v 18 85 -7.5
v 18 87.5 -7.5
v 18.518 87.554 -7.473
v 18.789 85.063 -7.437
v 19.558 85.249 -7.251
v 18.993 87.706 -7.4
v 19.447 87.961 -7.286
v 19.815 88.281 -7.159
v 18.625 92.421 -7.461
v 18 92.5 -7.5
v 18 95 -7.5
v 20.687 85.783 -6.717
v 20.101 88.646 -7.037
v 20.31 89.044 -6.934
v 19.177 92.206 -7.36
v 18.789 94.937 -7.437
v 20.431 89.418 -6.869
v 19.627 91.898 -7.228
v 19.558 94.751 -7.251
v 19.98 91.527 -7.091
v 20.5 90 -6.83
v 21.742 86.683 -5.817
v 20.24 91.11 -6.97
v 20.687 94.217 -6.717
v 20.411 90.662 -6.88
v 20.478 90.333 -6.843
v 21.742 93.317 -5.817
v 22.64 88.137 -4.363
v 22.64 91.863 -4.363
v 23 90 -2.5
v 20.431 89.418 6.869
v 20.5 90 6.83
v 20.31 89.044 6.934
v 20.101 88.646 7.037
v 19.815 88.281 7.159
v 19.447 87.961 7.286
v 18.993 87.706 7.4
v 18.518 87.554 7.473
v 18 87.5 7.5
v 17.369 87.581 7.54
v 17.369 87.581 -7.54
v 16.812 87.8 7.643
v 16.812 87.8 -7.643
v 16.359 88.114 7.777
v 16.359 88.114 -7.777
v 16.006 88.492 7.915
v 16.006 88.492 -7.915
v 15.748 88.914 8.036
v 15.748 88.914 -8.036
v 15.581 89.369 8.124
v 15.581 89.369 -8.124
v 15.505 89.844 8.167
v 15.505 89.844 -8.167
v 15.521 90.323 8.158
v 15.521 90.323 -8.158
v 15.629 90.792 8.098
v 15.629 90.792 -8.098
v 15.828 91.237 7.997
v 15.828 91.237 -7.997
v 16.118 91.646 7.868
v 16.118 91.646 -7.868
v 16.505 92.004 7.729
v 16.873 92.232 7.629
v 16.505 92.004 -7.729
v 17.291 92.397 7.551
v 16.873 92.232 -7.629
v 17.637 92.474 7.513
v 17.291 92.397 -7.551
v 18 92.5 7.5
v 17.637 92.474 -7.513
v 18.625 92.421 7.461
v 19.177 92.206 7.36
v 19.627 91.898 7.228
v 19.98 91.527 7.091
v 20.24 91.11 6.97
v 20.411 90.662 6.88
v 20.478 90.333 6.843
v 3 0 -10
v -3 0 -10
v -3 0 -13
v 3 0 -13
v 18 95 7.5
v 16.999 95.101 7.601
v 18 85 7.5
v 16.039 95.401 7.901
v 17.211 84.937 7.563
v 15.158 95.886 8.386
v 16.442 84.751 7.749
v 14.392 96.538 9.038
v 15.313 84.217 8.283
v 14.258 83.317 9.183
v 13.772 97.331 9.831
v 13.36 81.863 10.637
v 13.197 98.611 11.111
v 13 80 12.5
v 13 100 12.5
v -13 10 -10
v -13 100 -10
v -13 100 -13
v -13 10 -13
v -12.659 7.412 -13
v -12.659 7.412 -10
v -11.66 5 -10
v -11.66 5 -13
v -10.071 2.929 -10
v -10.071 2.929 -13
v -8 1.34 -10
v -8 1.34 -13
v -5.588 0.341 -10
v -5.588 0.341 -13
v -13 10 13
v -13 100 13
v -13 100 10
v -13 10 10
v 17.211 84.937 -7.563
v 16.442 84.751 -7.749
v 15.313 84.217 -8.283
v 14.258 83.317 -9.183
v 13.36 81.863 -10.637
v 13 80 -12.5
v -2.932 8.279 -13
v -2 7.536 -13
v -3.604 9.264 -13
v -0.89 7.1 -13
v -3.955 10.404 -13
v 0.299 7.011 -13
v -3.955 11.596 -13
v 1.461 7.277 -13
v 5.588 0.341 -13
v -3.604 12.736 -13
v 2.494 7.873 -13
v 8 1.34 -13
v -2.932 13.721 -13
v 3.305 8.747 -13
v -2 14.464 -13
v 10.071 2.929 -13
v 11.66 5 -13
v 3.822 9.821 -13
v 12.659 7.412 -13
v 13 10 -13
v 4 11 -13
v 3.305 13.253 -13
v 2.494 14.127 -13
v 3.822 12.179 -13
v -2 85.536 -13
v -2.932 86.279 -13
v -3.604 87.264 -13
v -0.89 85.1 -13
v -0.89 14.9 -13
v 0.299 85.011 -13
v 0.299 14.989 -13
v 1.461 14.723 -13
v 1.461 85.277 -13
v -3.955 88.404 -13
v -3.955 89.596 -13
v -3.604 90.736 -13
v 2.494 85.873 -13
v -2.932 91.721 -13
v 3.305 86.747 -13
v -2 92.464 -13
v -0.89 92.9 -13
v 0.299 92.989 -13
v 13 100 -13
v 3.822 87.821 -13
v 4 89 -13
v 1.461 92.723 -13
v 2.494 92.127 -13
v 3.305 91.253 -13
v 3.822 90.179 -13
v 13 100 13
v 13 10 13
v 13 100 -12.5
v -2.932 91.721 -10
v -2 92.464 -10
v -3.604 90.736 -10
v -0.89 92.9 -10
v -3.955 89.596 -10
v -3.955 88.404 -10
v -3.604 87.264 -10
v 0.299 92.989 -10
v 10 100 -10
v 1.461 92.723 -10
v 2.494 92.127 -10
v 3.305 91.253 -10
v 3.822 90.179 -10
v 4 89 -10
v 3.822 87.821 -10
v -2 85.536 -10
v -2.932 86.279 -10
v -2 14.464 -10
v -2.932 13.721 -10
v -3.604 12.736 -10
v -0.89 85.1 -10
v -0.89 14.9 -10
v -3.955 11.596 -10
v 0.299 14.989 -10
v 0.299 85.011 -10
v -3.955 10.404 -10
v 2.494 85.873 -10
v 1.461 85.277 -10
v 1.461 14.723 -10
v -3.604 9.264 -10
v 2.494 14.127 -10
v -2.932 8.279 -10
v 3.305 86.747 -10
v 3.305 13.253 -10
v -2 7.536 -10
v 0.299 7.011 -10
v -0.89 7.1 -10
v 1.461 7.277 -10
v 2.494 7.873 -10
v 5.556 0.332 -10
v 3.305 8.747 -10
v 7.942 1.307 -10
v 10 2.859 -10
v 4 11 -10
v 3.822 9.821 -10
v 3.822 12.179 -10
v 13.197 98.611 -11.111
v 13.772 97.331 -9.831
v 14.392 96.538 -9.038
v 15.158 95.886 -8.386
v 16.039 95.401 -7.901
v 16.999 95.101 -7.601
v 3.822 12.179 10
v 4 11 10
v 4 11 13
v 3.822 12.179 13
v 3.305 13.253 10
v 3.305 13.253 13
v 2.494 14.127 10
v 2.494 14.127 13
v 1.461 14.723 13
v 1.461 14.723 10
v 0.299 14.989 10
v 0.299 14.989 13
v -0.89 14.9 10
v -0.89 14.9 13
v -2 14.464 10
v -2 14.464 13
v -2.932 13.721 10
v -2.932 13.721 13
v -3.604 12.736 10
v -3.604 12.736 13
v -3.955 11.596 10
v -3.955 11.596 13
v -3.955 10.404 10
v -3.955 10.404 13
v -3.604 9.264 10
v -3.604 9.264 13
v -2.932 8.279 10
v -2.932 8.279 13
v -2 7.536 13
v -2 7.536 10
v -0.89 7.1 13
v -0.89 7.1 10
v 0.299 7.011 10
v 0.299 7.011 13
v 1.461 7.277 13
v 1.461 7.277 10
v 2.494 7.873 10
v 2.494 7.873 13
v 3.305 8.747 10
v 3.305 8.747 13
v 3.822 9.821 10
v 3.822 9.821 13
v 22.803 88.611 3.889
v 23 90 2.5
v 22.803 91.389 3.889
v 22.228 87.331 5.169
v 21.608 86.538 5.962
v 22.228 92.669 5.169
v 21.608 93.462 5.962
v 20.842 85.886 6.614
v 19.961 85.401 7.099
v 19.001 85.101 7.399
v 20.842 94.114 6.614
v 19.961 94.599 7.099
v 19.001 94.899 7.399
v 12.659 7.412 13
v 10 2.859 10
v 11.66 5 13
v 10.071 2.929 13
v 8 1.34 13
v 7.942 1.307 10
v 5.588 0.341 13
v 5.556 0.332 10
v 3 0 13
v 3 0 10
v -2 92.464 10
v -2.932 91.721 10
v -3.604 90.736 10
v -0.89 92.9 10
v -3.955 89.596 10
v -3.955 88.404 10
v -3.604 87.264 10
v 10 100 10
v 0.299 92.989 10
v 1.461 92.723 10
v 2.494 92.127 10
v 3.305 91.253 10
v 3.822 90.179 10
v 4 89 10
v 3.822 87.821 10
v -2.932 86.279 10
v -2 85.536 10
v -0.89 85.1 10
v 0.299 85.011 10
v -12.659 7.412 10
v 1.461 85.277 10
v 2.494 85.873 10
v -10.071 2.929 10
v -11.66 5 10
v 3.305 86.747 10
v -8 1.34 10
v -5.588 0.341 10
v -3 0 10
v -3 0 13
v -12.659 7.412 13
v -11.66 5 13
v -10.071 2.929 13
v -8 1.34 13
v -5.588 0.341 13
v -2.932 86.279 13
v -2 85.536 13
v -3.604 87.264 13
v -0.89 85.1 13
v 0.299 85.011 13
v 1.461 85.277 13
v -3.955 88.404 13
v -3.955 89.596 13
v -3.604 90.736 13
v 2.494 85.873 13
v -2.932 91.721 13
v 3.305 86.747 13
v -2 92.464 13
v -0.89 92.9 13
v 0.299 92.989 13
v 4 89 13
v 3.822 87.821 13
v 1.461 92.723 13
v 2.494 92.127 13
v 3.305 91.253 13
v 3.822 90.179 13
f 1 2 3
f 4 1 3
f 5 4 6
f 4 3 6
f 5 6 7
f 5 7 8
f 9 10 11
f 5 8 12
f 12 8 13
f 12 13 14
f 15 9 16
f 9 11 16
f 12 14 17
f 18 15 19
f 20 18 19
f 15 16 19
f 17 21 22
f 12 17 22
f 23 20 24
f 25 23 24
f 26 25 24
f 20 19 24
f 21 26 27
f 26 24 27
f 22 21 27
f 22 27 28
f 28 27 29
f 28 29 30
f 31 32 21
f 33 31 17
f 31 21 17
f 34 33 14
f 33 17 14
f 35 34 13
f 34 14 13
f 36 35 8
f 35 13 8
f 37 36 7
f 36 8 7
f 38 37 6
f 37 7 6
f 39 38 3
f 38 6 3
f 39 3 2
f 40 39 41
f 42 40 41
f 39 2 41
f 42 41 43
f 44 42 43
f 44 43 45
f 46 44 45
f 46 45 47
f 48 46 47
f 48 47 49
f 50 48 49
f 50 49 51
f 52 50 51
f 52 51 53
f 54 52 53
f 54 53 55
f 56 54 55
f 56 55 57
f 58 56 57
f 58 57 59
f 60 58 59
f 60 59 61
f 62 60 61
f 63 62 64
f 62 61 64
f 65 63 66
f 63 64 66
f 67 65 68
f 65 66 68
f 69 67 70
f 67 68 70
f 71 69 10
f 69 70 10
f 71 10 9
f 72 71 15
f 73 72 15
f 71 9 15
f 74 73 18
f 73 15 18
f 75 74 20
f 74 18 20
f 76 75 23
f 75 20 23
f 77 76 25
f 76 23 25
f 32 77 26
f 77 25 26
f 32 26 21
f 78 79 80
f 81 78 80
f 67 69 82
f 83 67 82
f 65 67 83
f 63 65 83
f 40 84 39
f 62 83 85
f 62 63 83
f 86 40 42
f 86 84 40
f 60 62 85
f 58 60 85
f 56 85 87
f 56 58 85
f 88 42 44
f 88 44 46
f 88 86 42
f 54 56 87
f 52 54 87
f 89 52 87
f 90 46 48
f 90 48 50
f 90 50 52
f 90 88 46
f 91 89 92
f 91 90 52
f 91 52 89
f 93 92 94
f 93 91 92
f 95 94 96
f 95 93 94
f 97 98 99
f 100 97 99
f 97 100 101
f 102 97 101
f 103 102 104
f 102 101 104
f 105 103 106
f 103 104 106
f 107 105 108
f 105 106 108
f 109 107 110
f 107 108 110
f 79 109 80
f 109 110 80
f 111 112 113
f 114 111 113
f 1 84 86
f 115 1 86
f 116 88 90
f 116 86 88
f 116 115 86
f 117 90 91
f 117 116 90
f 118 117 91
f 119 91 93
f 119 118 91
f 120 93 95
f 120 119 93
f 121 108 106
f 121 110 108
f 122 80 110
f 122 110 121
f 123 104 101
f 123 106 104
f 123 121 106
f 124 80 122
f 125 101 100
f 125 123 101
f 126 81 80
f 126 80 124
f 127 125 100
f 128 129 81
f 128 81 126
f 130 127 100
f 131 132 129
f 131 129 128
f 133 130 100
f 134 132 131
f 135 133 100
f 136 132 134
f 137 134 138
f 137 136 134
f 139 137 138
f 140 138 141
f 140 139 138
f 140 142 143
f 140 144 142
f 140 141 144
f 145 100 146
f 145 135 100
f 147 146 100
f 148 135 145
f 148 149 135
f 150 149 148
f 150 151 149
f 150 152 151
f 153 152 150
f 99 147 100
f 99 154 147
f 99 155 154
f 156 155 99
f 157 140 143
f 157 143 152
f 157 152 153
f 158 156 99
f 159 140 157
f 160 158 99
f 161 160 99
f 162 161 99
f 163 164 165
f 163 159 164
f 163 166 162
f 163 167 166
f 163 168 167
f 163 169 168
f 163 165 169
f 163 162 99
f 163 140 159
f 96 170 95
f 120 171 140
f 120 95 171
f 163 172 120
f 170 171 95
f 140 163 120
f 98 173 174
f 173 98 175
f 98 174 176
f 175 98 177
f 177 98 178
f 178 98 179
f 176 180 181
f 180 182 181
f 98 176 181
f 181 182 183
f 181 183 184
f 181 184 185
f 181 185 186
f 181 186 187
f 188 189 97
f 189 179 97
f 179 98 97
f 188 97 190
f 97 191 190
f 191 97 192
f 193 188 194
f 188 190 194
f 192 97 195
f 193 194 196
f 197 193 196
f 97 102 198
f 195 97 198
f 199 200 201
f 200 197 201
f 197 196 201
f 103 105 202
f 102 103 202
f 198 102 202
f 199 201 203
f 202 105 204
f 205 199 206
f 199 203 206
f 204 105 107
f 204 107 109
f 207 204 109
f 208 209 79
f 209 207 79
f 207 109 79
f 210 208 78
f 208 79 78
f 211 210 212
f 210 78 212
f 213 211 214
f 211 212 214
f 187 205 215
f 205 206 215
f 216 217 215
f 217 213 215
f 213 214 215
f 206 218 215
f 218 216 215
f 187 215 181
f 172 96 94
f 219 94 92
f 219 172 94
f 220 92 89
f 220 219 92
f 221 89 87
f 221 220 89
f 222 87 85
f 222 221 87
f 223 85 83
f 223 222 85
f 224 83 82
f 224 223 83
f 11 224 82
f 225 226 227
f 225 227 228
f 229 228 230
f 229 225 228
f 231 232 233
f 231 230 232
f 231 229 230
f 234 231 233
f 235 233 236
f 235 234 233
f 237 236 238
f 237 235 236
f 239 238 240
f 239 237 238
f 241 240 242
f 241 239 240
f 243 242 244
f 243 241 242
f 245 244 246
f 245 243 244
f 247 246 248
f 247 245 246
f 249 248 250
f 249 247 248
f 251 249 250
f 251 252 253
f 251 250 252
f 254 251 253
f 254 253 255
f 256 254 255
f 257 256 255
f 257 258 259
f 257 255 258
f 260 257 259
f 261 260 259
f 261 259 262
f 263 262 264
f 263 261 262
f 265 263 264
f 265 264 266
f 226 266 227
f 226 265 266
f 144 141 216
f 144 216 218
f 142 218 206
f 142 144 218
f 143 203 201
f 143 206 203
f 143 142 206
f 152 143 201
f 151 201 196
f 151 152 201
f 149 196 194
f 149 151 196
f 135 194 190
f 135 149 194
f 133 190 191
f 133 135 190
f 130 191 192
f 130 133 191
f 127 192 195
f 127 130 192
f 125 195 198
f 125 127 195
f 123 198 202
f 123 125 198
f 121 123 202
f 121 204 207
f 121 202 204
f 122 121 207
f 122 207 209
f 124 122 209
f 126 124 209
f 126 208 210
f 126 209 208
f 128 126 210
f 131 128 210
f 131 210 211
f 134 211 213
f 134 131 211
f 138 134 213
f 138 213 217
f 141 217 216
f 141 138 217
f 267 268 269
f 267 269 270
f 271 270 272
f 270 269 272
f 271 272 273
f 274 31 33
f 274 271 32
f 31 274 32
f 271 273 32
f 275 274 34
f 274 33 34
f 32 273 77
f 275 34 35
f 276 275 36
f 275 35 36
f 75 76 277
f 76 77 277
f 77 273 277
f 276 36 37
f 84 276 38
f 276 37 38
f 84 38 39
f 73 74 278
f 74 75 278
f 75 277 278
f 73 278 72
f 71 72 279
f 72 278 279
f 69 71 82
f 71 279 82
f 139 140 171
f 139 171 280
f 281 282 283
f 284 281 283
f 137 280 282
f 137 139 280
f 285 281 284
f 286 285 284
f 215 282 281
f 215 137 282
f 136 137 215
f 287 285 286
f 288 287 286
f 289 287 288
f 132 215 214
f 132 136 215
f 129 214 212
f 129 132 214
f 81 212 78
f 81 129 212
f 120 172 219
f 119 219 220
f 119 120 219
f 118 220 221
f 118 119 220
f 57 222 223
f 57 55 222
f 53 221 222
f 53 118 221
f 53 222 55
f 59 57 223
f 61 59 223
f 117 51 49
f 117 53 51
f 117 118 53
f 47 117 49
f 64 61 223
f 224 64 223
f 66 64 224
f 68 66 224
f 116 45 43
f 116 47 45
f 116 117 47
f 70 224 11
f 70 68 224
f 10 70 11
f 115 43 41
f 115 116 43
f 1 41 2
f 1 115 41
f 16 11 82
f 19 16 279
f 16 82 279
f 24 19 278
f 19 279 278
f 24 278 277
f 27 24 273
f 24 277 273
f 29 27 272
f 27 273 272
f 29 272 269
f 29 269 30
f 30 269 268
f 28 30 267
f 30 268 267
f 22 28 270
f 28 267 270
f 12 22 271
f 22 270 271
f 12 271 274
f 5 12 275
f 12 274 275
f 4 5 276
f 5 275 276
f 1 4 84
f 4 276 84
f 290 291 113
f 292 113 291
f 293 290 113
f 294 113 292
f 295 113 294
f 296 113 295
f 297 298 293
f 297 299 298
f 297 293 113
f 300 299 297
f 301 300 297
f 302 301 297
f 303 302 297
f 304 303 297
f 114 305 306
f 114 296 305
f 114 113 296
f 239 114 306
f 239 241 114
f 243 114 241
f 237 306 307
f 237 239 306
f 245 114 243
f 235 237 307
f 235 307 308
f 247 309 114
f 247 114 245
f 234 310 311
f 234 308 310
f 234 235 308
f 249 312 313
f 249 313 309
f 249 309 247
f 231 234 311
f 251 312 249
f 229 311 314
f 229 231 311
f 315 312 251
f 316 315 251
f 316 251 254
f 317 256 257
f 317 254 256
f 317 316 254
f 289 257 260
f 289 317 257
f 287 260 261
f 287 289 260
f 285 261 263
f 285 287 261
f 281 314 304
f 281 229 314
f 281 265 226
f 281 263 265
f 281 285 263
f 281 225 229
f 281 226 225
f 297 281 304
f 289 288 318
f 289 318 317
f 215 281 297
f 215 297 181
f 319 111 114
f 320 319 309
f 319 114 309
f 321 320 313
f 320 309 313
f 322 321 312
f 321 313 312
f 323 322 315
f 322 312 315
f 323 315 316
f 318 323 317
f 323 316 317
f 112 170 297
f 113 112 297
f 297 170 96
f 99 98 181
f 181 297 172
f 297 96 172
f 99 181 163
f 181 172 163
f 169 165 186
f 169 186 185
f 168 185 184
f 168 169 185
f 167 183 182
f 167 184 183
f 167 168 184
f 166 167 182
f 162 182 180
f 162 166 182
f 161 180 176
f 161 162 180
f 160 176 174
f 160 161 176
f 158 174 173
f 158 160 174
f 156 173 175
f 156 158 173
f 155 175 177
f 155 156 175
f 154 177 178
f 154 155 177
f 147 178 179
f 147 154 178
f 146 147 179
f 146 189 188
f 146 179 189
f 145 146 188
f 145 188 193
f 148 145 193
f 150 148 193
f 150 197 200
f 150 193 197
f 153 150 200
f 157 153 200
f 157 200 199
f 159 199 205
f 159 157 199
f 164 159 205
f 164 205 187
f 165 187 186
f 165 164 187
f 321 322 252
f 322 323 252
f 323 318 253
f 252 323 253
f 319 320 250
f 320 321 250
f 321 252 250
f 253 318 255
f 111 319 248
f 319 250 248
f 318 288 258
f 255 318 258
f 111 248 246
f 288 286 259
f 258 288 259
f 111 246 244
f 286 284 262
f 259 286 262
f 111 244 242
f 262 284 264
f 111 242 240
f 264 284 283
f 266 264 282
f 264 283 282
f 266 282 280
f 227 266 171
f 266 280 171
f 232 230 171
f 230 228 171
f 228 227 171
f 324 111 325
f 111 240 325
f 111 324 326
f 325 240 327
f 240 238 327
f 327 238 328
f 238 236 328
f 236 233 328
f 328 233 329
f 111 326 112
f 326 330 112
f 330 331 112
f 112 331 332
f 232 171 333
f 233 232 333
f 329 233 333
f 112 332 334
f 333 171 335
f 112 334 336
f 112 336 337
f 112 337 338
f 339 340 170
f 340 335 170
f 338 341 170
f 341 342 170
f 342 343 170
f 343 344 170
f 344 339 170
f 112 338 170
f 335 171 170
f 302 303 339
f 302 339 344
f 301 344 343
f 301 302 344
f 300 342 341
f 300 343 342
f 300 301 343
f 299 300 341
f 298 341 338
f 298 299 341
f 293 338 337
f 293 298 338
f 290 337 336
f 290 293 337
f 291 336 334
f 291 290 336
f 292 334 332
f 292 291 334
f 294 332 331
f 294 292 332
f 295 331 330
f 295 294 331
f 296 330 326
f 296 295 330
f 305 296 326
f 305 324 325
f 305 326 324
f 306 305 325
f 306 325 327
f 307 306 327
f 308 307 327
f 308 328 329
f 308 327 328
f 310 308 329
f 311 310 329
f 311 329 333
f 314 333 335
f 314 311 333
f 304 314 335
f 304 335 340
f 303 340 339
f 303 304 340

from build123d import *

# Parameters (mm, degrees)
SKETCH1_W               = 26
SKETCH1_H               = 100
BOSS_EXTRUDE1_DEPTH     = 13
FILLET1_R               = 10
SKETCH5_W               = 10
SKETCH5_H               = 10
SKETCH5_R               = 2.5
BOSS_EXTRUDE3_DEPTH     = 7.5
FILLET2_R               = 5
CUT_EXTRUDE1_DEPTH      = 104.431136533
CUT_EXTRUDE1_DEPTH_BACK = 104.431136533
SKETCH6_W               = 23
SKETCH6_H               = 20
CUT_EXTRUDE2_DEPTH      = 104.43113663
CUT_EXTRUDE2_DEPTH_BACK = 104.43113663
SKETCH3_R               = 4


with BuildPart() as part:
    # Sketch1 → Boss-Extrude1 (new, symmetric)
    with BuildSketch(Plane(origin=(0, 0, 0), x_dir=(0, 0, -1), z_dir=(1, 0, 0))):
        with Locations((0, 50)):
            Rectangle(SKETCH1_W, SKETCH1_H)
    extrude(amount=BOSS_EXTRUDE1_DEPTH, both=True)

    # Fillet1
    fillet1_edges = [part.edges().sort_by_distance(p)[0] for p in [
        (-13, 0, 0),
        (13, 0, 0),
    ]]
    fillet(fillet1_edges, radius=FILLET1_R)

    # Sketch5 → Boss-Extrude3 (add, symmetric)
    with BuildSketch(Plane.XY):
        with Locations((18, 90)):
            Rectangle(SKETCH5_W, SKETCH5_H)
        with Locations((18, 90)):
            Circle(SKETCH5_R, mode=Mode.SUBTRACT)
    extrude(amount=BOSS_EXTRUDE3_DEPTH, both=True)

    # Fillet2
    # the kernel refuses this fillet: 5 mm, written as the material it adds along each edge
    with BuildSketch(Plane(origin=(13, 85, 7.5), x_dir=(0, 0, 1), z_dir=(0, 1, 0))) as fillet2_piece_1_section:
        with BuildLine():
            CenterArc((FILLET2_R, FILLET2_R), FILLET2_R, 180, 90)
            Line((0, FILLET2_R), (0, 0))
            Line((0, 0), (FILLET2_R, 0))
        make_face()
    fillet2_piece_1 = extrude(amount=10, mode=Mode.PRIVATE)
    fillet2_piece_1 = fillet2_piece_1 - Plane(origin=(18, 90, 8.676026407), x_dir=(1, 0, 0), z_dir=(0, 0, -1)) * Cylinder(2.5, 41, mode=Mode.PRIVATE)
    add(fillet2_piece_1)
    with BuildSketch(Plane(origin=(13, 85, -7.5), x_dir=(0, 0, -1), z_dir=(0, 1, 0))) as fillet2_piece_2_section:
        with BuildLine():
            CenterArc((FILLET2_R, -FILLET2_R), FILLET2_R, 90, 90)
            Line((0, -FILLET2_R), (0, 0))
            Line((0, 0), (FILLET2_R, 0))
        make_face()
    fillet2_piece_2 = extrude(amount=10, mode=Mode.PRIVATE)
    fillet2_piece_2 = fillet2_piece_2 - Plane(origin=(18, 90, -8.676026407), x_dir=(1, 0, 0), z_dir=(0, 0, -1)) * Cylinder(2.5, 41, mode=Mode.PRIVATE)
    add(fillet2_piece_2)
    with BuildSketch(Plane(origin=(13, 95, -7.5), x_dir=(0, 1, 0), z_dir=(0, 0, 1))) as fillet2_piece_3:
        with BuildLine():
            CenterArc((FILLET2_R, -FILLET2_R), FILLET2_R, 90, 90)
            Line((0, -FILLET2_R), (0, 0))
            Line((0, 0), (FILLET2_R, 0))
        make_face()
    extrude(amount=15)
    with BuildSketch(Plane(origin=(13, 85, -7.5), x_dir=(0, -1, 0), z_dir=(0, 0, 1))) as fillet2_piece_4:
        with BuildLine():
            CenterArc((FILLET2_R, FILLET2_R), FILLET2_R, 180, 90)
            Line((0, FILLET2_R), (0, 0))
            Line((0, 0), (FILLET2_R, 0))
        make_face()
    extrude(amount=15)
    with BuildSketch(Plane(origin=(13, 72.5, 7.5), x_dir=(0, 0, 1), z_dir=(0, 1, 0))) as fillet2_piece_5a_section:
        with BuildLine():
            CenterArc((FILLET2_R, FILLET2_R), FILLET2_R, 180, 90)
            Line((0, FILLET2_R), (0, 0))
            Line((0, 0), (FILLET2_R, 0))
        make_face()
    fillet2_piece_5a = extrude(amount=22.5, mode=Mode.PRIVATE)
    fillet2_piece_5a = split(fillet2_piece_5a, bisect_by=Plane(origin=(14.131975571, 85, 8.631975571), z_dir=(0, -1, 0)), keep=Keep.TOP, mode=Mode.PRIVATE)
    with BuildSketch(Plane(origin=(13, 85, -7.5), x_dir=(0, -1, 0), z_dir=(0, 0, 1))) as fillet2_piece_5b_section:
        with BuildLine():
            CenterArc((FILLET2_R, FILLET2_R), FILLET2_R, 180, 90)
            Line((0, FILLET2_R), (0, 0))
            Line((0, 0), (FILLET2_R, 0))
        make_face()
    fillet2_piece_5b = extrude(amount=27.5, mode=Mode.PRIVATE)
    fillet2_piece_5b = split(fillet2_piece_5b, bisect_by=Plane(origin=(14.131975571, 83.868024429, 13), z_dir=(0, 0, -1)), keep=Keep.TOP, mode=Mode.PRIVATE)
    fillet2_piece_5b = split(fillet2_piece_5b, bisect_by=Plane(origin=(14.131975571, 83.868024429, 7.5), z_dir=(0, 0, 1)), keep=Keep.TOP, mode=Mode.PRIVATE)
    fillet2_piece_5 = fillet2_piece_5a & fillet2_piece_5b
    add(fillet2_piece_5)
    with BuildSketch(Plane(origin=(13, 95, -7.5), x_dir=(0, 1, 0), z_dir=(0, 0, 1))) as fillet2_piece_6a_section:
        with BuildLine():
            CenterArc((FILLET2_R, -FILLET2_R), FILLET2_R, 90, 90)
            Line((0, -FILLET2_R), (0, 0))
            Line((0, 0), (FILLET2_R, 0))
        make_face()
    fillet2_piece_6a = extrude(amount=27.5, mode=Mode.PRIVATE)
    fillet2_piece_6a = split(fillet2_piece_6a, bisect_by=Plane(origin=(14.131975571, 96.131975571, 13), z_dir=(0, 0, -1)), keep=Keep.TOP, mode=Mode.PRIVATE)
    fillet2_piece_6a = split(fillet2_piece_6a, bisect_by=Plane(origin=(14.131975571, 96.131975571, 7.5), z_dir=(0, 0, 1)), keep=Keep.TOP, mode=Mode.PRIVATE)
    with BuildSketch(Plane(origin=(13, 85, 7.5), x_dir=(0, 0, 1), z_dir=(0, 1, 0))) as fillet2_piece_6b_section:
        with BuildLine():
            CenterArc((FILLET2_R, FILLET2_R), FILLET2_R, 180, 90)
            Line((0, FILLET2_R), (0, 0))
            Line((0, 0), (FILLET2_R, 0))
        make_face()
    fillet2_piece_6b = extrude(amount=22.5, mode=Mode.PRIVATE)
    fillet2_piece_6b = split(fillet2_piece_6b, bisect_by=Plane(origin=(14.131975571, 100, 8.631975571), z_dir=(0, -1, 0)), keep=Keep.TOP, mode=Mode.PRIVATE)
    fillet2_piece_6b = split(fillet2_piece_6b, bisect_by=Plane(origin=(14.131975571, 95, 8.631975571), z_dir=(0, 1, 0)), keep=Keep.TOP, mode=Mode.PRIVATE)
    fillet2_piece_6 = fillet2_piece_6a & fillet2_piece_6b
    add(fillet2_piece_6)
    with BuildSketch(Plane(origin=(13, 85, -20), x_dir=(0, -1, 0), z_dir=(0, 0, 1))) as fillet2_piece_7a_section:
        with BuildLine():
            CenterArc((FILLET2_R, FILLET2_R), FILLET2_R, 180, 90)
            Line((0, FILLET2_R), (0, 0))
            Line((0, 0), (FILLET2_R, 0))
        make_face()
    fillet2_piece_7a = extrude(amount=27.5, mode=Mode.PRIVATE)
    fillet2_piece_7a = split(fillet2_piece_7a, bisect_by=Plane(origin=(14.131975571, 83.868024429, -13), z_dir=(0, 0, 1)), keep=Keep.TOP, mode=Mode.PRIVATE)
    fillet2_piece_7a = split(fillet2_piece_7a, bisect_by=Plane(origin=(14.131975571, 83.868024429, -7.5), z_dir=(0, 0, -1)), keep=Keep.TOP, mode=Mode.PRIVATE)
    with BuildSketch(Plane(origin=(13, 72.5, -7.5), x_dir=(0, 0, -1), z_dir=(0, 1, 0))) as fillet2_piece_7b_section:
        with BuildLine():
            CenterArc((FILLET2_R, -FILLET2_R), FILLET2_R, 90, 90)
            Line((0, -FILLET2_R), (0, 0))
            Line((0, 0), (FILLET2_R, 0))
        make_face()
    fillet2_piece_7b = extrude(amount=22.5, mode=Mode.PRIVATE)
    fillet2_piece_7b = split(fillet2_piece_7b, bisect_by=Plane(origin=(14.131975571, 85, -8.631975571), z_dir=(0, -1, 0)), keep=Keep.TOP, mode=Mode.PRIVATE)
    fillet2_piece_7 = fillet2_piece_7a & fillet2_piece_7b
    add(fillet2_piece_7)
    with BuildSketch(Plane(origin=(13, 95, -20), x_dir=(0, 1, 0), z_dir=(0, 0, 1))) as fillet2_piece_8a_section:
        with BuildLine():
            CenterArc((FILLET2_R, -FILLET2_R), FILLET2_R, 90, 90)
            Line((0, -FILLET2_R), (0, 0))
            Line((0, 0), (FILLET2_R, 0))
        make_face()
    fillet2_piece_8a = extrude(amount=27.5, mode=Mode.PRIVATE)
    fillet2_piece_8a = split(fillet2_piece_8a, bisect_by=Plane(origin=(14.131975571, 96.131975571, -13), z_dir=(0, 0, 1)), keep=Keep.TOP, mode=Mode.PRIVATE)
    fillet2_piece_8a = split(fillet2_piece_8a, bisect_by=Plane(origin=(14.131975571, 96.131975571, -7.5), z_dir=(0, 0, -1)), keep=Keep.TOP, mode=Mode.PRIVATE)
    with BuildSketch(Plane(origin=(13, 85, -7.5), x_dir=(0, 0, -1), z_dir=(0, 1, 0))) as fillet2_piece_8b_section:
        with BuildLine():
            CenterArc((FILLET2_R, -FILLET2_R), FILLET2_R, 90, 90)
            Line((0, -FILLET2_R), (0, 0))
            Line((0, 0), (FILLET2_R, 0))
        make_face()
    fillet2_piece_8b = extrude(amount=22.5, mode=Mode.PRIVATE)
    fillet2_piece_8b = split(fillet2_piece_8b, bisect_by=Plane(origin=(14.131975571, 100, -8.631975571), z_dir=(0, -1, 0)), keep=Keep.TOP, mode=Mode.PRIVATE)
    fillet2_piece_8b = split(fillet2_piece_8b, bisect_by=Plane(origin=(14.131975571, 95, -8.631975571), z_dir=(0, 1, 0)), keep=Keep.TOP, mode=Mode.PRIVATE)
    fillet2_piece_8 = fillet2_piece_8a & fillet2_piece_8b
    add(fillet2_piece_8)
    # the kernel refuses this fillet: 5 mm, written as the material it takes off along each edge
    with BuildSketch(Plane(origin=(23, 107.5, -7.5), x_dir=(-1, 0, 0), z_dir=(0, -1, 0)), Plane(origin=(23, 107.5, 7.5), x_dir=(0, 0, -1), z_dir=(0, -1, 0))) as fillet2_2_piece_1:
        with BuildLine():
            CenterArc((FILLET2_R, -FILLET2_R), FILLET2_R, 90, 90)
            Line((0, -FILLET2_R), (0, 0))
            Line((0, 0), (FILLET2_R, 0))
        make_face()
    extrude(amount=35, mode=Mode.SUBTRACT)
    with BuildSketch(Plane(origin=(23, 95, 20), x_dir=(-1, 0, 0), z_dir=(0, 0, -1)), Plane(origin=(23, 85, 20), x_dir=(0, 1, 0), z_dir=(0, 0, -1))) as fillet2_2_piece_2:
        with BuildLine():
            CenterArc((FILLET2_R, -FILLET2_R), FILLET2_R, 90, 90)
            Line((0, -FILLET2_R), (0, 0))
            Line((0, 0), (FILLET2_R, 0))
        make_face()
    extrude(amount=40, mode=Mode.SUBTRACT)

    # Sketch6 → Cut-Extrude1 (cut, two sides: drawn at the far end of the back side and taken through both)
    with BuildSketch(Plane(origin=(0, 100, 0), x_dir=(1, 0, 0), z_dir=(0, 1, 0)).offset(-CUT_EXTRUDE1_DEPTH_BACK)):
        with Locations((-1.5, 0)):
            Rectangle(SKETCH6_W, SKETCH6_H)
    extrude(amount=CUT_EXTRUDE1_DEPTH + CUT_EXTRUDE1_DEPTH_BACK, mode=Mode.SUBTRACT)

    # Sketch3 → Cut-Extrude2 (cut, two sides: drawn at the far end of the back side and taken through both)
    with BuildSketch(Plane.XY.offset(-CUT_EXTRUDE2_DEPTH_BACK)):
        with Locations((0, 11)):
            Circle(SKETCH3_R)
        with Locations((0, 89)):
            Circle(SKETCH3_R)
    extrude(amount=CUT_EXTRUDE2_DEPTH + CUT_EXTRUDE2_DEPTH_BACK, mode=Mode.SUBTRACT)


solid = part.part
